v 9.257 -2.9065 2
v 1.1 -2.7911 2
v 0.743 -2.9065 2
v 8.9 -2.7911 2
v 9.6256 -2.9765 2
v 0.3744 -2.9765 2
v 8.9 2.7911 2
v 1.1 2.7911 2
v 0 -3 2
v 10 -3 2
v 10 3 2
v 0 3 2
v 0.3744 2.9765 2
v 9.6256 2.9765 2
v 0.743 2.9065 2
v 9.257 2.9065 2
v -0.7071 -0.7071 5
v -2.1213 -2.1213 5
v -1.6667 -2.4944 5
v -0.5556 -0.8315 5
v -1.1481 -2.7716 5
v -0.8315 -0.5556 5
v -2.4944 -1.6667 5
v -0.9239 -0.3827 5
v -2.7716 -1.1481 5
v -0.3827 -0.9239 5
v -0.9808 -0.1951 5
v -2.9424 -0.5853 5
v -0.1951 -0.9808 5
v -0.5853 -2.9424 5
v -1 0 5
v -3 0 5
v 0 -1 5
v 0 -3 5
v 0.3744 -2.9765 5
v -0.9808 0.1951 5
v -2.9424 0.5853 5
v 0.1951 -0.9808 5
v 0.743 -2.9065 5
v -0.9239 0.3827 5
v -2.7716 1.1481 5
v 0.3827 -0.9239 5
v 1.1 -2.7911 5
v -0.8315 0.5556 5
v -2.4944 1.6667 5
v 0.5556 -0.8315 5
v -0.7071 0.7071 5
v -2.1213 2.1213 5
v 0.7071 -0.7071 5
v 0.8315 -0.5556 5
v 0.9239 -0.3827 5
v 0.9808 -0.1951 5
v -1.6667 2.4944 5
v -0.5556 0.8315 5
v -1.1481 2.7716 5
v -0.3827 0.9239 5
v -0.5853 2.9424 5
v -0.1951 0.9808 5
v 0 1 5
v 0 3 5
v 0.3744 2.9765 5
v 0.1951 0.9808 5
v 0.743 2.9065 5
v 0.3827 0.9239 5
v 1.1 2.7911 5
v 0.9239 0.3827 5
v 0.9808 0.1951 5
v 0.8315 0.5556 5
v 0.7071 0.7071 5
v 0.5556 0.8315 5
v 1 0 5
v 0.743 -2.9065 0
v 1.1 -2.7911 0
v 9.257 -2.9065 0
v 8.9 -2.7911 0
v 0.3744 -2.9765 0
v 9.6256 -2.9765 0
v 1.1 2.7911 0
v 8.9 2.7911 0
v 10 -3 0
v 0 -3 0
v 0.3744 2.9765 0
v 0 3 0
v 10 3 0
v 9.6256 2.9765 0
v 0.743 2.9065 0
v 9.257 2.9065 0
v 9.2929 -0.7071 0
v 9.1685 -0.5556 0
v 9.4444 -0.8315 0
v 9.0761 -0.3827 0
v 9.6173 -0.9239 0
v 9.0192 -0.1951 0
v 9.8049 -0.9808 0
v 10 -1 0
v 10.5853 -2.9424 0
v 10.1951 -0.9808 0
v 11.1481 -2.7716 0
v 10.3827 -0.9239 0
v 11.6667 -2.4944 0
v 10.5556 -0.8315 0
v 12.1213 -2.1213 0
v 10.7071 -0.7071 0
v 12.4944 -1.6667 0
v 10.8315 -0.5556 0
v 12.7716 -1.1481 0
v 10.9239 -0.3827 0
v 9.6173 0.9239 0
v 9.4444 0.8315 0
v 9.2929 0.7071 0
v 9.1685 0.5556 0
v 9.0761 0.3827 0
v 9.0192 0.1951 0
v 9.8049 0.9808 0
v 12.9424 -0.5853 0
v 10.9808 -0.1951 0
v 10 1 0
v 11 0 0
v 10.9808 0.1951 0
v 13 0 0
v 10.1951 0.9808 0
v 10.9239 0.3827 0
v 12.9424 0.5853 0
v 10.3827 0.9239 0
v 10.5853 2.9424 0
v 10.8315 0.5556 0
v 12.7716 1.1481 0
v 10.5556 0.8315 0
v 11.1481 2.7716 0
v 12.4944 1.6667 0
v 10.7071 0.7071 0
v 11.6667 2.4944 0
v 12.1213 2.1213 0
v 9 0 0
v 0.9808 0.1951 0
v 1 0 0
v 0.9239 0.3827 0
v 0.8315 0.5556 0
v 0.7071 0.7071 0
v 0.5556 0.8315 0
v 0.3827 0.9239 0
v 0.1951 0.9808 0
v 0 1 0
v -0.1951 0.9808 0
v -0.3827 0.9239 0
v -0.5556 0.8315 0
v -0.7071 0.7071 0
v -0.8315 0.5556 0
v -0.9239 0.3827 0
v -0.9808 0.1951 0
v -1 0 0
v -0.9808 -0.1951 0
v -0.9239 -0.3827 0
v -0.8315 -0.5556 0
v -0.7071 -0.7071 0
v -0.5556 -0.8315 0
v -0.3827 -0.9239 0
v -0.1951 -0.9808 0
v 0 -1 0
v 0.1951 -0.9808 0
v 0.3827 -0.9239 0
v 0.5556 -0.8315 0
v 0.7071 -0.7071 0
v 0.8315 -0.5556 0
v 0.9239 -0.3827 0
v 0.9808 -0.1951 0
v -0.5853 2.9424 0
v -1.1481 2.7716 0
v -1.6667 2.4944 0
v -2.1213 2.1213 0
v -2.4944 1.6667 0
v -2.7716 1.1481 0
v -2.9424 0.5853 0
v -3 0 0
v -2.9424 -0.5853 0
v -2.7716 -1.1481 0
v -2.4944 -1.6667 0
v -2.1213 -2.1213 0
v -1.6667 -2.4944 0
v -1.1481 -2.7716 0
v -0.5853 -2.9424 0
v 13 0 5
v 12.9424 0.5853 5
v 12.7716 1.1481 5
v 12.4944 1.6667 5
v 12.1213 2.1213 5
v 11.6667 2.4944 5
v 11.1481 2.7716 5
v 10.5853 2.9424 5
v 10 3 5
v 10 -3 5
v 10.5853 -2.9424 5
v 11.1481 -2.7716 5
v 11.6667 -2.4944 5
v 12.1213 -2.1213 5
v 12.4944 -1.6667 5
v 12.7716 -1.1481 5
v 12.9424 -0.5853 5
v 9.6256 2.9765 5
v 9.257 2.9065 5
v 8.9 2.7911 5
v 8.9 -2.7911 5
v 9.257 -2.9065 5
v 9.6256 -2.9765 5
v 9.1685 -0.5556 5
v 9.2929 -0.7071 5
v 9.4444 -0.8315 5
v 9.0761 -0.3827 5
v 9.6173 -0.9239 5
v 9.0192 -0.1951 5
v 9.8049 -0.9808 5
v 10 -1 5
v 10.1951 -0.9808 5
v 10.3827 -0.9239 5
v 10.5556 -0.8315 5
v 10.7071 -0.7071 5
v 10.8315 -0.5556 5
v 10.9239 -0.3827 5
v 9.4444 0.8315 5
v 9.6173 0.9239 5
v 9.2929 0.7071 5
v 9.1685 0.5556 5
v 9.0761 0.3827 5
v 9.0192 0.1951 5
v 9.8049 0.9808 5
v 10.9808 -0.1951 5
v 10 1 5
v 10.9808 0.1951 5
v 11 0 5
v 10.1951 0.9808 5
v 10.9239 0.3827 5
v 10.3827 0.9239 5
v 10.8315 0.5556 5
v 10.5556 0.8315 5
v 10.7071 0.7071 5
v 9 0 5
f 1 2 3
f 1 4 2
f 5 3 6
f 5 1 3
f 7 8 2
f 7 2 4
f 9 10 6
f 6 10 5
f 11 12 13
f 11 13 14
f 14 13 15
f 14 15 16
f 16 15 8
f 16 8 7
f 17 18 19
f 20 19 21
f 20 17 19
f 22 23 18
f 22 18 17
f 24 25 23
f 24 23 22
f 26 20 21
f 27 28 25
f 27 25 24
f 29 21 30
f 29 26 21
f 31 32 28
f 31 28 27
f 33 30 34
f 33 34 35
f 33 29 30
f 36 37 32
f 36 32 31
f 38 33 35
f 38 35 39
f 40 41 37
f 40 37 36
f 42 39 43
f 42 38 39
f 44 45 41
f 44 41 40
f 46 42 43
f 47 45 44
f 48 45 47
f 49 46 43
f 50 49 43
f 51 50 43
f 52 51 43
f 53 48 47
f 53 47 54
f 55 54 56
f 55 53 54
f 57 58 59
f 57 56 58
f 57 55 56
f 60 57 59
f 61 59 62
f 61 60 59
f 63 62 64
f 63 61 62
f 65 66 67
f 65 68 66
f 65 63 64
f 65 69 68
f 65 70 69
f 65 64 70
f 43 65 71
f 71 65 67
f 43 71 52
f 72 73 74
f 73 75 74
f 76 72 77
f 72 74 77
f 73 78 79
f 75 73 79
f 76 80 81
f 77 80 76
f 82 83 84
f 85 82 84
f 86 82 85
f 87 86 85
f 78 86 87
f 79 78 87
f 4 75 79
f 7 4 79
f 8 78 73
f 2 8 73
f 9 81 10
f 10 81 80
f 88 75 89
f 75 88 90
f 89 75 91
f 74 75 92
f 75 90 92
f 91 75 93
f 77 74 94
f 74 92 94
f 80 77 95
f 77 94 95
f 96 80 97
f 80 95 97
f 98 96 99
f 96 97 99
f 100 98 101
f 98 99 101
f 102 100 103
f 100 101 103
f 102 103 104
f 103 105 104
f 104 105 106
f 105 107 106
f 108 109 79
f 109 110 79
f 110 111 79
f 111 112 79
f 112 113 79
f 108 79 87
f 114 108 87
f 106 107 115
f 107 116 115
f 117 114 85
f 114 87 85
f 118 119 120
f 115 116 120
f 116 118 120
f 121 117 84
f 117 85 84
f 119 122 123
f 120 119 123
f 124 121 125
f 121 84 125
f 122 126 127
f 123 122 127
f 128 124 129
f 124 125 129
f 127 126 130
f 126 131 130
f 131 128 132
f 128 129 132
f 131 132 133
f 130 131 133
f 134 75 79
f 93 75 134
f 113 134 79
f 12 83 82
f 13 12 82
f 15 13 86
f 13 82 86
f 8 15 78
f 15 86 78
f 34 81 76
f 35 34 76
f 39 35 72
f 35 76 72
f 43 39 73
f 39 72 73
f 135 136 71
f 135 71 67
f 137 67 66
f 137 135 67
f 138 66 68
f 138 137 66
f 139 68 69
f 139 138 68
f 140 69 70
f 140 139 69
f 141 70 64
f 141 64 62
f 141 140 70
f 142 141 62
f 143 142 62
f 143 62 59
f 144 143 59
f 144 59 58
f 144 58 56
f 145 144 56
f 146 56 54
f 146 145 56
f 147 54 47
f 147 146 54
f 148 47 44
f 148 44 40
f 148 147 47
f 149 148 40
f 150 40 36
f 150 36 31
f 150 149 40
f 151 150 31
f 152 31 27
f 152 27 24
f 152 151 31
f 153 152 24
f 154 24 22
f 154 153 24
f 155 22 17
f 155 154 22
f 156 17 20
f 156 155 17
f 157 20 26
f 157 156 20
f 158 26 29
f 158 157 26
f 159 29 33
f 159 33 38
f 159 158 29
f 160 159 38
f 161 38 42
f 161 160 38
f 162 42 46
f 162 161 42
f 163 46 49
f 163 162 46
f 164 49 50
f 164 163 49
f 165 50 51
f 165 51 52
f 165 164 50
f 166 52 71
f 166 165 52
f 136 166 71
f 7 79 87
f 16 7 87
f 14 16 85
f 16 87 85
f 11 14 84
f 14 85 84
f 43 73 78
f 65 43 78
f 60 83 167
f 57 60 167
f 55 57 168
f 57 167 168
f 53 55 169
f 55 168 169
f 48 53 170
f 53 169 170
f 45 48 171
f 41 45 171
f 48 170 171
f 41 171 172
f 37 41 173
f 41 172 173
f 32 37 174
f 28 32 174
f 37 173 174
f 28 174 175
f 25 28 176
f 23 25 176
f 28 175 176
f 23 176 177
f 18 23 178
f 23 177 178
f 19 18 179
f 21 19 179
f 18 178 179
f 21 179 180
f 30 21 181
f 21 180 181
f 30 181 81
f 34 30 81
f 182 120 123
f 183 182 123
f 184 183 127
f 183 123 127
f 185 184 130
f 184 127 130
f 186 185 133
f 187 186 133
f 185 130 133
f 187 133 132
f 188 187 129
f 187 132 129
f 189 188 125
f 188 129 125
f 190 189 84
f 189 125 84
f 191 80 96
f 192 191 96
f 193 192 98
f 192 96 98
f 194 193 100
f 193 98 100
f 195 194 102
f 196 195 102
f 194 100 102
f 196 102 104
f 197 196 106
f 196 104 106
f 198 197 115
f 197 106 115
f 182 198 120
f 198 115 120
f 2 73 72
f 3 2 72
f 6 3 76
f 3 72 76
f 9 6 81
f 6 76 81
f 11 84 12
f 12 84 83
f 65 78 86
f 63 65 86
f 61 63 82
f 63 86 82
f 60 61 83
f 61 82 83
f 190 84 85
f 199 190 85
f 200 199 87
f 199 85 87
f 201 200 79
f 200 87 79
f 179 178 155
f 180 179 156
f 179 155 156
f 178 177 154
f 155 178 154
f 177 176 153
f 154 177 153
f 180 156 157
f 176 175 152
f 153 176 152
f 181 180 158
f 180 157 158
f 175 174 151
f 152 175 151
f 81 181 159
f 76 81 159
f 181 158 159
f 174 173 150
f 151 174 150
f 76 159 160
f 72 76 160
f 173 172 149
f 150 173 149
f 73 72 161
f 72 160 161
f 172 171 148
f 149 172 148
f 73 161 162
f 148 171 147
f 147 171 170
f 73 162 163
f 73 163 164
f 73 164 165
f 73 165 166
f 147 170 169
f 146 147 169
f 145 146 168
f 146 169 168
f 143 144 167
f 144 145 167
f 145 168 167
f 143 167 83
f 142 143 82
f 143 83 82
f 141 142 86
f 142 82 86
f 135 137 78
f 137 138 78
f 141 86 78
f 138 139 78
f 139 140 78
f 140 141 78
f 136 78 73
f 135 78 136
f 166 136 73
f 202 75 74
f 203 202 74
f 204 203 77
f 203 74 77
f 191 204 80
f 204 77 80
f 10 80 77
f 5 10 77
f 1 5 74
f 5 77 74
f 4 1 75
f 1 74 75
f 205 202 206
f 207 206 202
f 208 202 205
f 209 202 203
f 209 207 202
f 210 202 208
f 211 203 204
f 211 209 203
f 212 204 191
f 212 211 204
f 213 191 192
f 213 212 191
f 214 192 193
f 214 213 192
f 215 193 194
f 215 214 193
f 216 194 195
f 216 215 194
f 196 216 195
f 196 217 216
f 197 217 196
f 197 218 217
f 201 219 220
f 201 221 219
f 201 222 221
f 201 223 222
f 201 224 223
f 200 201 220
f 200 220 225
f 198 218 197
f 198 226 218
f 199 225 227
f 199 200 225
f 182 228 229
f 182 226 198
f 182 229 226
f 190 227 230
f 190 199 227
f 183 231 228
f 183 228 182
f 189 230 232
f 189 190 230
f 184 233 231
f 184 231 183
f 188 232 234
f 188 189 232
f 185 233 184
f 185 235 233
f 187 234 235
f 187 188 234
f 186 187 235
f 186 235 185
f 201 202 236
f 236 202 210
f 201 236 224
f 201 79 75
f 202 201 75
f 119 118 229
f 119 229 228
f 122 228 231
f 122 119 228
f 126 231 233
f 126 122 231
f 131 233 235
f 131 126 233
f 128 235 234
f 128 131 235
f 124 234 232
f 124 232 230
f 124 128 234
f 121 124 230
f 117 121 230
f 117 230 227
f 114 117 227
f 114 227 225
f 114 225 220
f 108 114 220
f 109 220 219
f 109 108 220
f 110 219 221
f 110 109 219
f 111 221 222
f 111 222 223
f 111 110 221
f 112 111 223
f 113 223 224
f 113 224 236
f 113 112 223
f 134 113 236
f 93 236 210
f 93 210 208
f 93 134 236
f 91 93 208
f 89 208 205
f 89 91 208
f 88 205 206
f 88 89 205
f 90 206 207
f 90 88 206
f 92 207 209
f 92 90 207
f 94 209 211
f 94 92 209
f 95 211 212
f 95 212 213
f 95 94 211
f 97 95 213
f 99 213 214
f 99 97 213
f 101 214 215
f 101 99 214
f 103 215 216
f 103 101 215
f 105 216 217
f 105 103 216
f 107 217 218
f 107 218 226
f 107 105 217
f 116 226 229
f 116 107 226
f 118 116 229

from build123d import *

# Parameters (mm, degrees)
F0_R     = 1
F1_DEPTH = 5
F2_DEPTH = 2


with BuildPart() as f1:
    # F0 (on Top) → F1 (new body)
    with BuildSketch(Plane.XY):
        with BuildLine():
            Line((1.1, -2.7910571474), (1.1, 2.7910571474))
            ThreePointArc((1.1, 2.7910571474), (0.559834153, 2.9473014303), (0, 3))
            ThreePointArc((0, 3), (-3, 0), (0, -3))
            ThreePointArc((0, -3), (0.559834153, -2.9473014303), (1.1, -2.7910571474))
        make_face()
        Circle(F0_R, mode=Mode.SUBTRACT)
    extrude(amount=F1_DEPTH)


with BuildPart() as f1b:
    # F0 (on Top) → F1, piece 2 (new body)
    with BuildSketch(Plane.XY):
        with BuildLine():
            ThreePointArc((13, 0), (12.1213203436, 2.1213203436), (10, 3))
            ThreePointArc((10, 3), (9.440165847, 2.9473014303), (8.9, 2.7910571474))
            Line((8.9, 2.7910571474), (8.9, -2.7910571474))
            ThreePointArc((8.9, -2.7910571474), (9.440165847, -2.9473014303), (10, -3))
            ThreePointArc((10, -3), (12.1213203436, -2.1213203436), (13, 0))
        make_face()
        with Locations((10, 0)):
            Circle(F0_R, mode=Mode.SUBTRACT)
    extrude(amount=F1_DEPTH)


with BuildPart() as f2:
    # F0 (on Top) → F2 (new body)
    with BuildSketch(Plane.XY):
        with BuildLine():
            ThreePointArc((1.1, -2.7910571474), (2.4799193535, -1.6881943016), (3, 0))
            ThreePointArc((3, 0), (2.4799193535, 1.6881943016), (1.1, 2.7910571474))
            Line((1.1, 2.7910571474), (1.1, -2.7910571474))
        make_face()
        with BuildLine():
            ThreePointArc((1.1, 2.7910571474), (2.4799193535, 1.6881943016), (3, 0))
            ThreePointArc((3, 0), (2.4799193535, -1.6881943016), (1.1, -2.7910571474))
            ThreePointArc((1.1, -2.7910571474), (0.559834153, -2.9473014303), (0, -3))
            Line((0, -3), (5, -3))
            Line((5, -3), (5, 3))
            Line((5, 3), (0, 3))
            ThreePointArc((0, 3), (0.559834153, 2.9473014303), (1.1, 2.7910571474))
        make_face()
        with BuildLine():
            Line((10, 3), (5, 3))
            Line((5, 3), (5, -3))
            Line((5, -3), (10, -3))
            ThreePointArc((10, -3), (9.440165847, -2.9473014303), (8.9, -2.7910571474))
            ThreePointArc((8.9, -2.7910571474), (7, 0), (8.9, 2.7910571474))
            ThreePointArc((8.9, 2.7910571474), (9.440165847, 2.9473014303), (10, 3))
        make_face()
        with BuildLine():
            Line((8.9, -2.7910571474), (8.9, 2.7910571474))
            ThreePointArc((8.9, 2.7910571474), (7, 0), (8.9, -2.7910571474))
        make_face()
    extrude(amount=F2_DEPTH)


solid = Compound([f1.part, f1b.part, f2.part])
